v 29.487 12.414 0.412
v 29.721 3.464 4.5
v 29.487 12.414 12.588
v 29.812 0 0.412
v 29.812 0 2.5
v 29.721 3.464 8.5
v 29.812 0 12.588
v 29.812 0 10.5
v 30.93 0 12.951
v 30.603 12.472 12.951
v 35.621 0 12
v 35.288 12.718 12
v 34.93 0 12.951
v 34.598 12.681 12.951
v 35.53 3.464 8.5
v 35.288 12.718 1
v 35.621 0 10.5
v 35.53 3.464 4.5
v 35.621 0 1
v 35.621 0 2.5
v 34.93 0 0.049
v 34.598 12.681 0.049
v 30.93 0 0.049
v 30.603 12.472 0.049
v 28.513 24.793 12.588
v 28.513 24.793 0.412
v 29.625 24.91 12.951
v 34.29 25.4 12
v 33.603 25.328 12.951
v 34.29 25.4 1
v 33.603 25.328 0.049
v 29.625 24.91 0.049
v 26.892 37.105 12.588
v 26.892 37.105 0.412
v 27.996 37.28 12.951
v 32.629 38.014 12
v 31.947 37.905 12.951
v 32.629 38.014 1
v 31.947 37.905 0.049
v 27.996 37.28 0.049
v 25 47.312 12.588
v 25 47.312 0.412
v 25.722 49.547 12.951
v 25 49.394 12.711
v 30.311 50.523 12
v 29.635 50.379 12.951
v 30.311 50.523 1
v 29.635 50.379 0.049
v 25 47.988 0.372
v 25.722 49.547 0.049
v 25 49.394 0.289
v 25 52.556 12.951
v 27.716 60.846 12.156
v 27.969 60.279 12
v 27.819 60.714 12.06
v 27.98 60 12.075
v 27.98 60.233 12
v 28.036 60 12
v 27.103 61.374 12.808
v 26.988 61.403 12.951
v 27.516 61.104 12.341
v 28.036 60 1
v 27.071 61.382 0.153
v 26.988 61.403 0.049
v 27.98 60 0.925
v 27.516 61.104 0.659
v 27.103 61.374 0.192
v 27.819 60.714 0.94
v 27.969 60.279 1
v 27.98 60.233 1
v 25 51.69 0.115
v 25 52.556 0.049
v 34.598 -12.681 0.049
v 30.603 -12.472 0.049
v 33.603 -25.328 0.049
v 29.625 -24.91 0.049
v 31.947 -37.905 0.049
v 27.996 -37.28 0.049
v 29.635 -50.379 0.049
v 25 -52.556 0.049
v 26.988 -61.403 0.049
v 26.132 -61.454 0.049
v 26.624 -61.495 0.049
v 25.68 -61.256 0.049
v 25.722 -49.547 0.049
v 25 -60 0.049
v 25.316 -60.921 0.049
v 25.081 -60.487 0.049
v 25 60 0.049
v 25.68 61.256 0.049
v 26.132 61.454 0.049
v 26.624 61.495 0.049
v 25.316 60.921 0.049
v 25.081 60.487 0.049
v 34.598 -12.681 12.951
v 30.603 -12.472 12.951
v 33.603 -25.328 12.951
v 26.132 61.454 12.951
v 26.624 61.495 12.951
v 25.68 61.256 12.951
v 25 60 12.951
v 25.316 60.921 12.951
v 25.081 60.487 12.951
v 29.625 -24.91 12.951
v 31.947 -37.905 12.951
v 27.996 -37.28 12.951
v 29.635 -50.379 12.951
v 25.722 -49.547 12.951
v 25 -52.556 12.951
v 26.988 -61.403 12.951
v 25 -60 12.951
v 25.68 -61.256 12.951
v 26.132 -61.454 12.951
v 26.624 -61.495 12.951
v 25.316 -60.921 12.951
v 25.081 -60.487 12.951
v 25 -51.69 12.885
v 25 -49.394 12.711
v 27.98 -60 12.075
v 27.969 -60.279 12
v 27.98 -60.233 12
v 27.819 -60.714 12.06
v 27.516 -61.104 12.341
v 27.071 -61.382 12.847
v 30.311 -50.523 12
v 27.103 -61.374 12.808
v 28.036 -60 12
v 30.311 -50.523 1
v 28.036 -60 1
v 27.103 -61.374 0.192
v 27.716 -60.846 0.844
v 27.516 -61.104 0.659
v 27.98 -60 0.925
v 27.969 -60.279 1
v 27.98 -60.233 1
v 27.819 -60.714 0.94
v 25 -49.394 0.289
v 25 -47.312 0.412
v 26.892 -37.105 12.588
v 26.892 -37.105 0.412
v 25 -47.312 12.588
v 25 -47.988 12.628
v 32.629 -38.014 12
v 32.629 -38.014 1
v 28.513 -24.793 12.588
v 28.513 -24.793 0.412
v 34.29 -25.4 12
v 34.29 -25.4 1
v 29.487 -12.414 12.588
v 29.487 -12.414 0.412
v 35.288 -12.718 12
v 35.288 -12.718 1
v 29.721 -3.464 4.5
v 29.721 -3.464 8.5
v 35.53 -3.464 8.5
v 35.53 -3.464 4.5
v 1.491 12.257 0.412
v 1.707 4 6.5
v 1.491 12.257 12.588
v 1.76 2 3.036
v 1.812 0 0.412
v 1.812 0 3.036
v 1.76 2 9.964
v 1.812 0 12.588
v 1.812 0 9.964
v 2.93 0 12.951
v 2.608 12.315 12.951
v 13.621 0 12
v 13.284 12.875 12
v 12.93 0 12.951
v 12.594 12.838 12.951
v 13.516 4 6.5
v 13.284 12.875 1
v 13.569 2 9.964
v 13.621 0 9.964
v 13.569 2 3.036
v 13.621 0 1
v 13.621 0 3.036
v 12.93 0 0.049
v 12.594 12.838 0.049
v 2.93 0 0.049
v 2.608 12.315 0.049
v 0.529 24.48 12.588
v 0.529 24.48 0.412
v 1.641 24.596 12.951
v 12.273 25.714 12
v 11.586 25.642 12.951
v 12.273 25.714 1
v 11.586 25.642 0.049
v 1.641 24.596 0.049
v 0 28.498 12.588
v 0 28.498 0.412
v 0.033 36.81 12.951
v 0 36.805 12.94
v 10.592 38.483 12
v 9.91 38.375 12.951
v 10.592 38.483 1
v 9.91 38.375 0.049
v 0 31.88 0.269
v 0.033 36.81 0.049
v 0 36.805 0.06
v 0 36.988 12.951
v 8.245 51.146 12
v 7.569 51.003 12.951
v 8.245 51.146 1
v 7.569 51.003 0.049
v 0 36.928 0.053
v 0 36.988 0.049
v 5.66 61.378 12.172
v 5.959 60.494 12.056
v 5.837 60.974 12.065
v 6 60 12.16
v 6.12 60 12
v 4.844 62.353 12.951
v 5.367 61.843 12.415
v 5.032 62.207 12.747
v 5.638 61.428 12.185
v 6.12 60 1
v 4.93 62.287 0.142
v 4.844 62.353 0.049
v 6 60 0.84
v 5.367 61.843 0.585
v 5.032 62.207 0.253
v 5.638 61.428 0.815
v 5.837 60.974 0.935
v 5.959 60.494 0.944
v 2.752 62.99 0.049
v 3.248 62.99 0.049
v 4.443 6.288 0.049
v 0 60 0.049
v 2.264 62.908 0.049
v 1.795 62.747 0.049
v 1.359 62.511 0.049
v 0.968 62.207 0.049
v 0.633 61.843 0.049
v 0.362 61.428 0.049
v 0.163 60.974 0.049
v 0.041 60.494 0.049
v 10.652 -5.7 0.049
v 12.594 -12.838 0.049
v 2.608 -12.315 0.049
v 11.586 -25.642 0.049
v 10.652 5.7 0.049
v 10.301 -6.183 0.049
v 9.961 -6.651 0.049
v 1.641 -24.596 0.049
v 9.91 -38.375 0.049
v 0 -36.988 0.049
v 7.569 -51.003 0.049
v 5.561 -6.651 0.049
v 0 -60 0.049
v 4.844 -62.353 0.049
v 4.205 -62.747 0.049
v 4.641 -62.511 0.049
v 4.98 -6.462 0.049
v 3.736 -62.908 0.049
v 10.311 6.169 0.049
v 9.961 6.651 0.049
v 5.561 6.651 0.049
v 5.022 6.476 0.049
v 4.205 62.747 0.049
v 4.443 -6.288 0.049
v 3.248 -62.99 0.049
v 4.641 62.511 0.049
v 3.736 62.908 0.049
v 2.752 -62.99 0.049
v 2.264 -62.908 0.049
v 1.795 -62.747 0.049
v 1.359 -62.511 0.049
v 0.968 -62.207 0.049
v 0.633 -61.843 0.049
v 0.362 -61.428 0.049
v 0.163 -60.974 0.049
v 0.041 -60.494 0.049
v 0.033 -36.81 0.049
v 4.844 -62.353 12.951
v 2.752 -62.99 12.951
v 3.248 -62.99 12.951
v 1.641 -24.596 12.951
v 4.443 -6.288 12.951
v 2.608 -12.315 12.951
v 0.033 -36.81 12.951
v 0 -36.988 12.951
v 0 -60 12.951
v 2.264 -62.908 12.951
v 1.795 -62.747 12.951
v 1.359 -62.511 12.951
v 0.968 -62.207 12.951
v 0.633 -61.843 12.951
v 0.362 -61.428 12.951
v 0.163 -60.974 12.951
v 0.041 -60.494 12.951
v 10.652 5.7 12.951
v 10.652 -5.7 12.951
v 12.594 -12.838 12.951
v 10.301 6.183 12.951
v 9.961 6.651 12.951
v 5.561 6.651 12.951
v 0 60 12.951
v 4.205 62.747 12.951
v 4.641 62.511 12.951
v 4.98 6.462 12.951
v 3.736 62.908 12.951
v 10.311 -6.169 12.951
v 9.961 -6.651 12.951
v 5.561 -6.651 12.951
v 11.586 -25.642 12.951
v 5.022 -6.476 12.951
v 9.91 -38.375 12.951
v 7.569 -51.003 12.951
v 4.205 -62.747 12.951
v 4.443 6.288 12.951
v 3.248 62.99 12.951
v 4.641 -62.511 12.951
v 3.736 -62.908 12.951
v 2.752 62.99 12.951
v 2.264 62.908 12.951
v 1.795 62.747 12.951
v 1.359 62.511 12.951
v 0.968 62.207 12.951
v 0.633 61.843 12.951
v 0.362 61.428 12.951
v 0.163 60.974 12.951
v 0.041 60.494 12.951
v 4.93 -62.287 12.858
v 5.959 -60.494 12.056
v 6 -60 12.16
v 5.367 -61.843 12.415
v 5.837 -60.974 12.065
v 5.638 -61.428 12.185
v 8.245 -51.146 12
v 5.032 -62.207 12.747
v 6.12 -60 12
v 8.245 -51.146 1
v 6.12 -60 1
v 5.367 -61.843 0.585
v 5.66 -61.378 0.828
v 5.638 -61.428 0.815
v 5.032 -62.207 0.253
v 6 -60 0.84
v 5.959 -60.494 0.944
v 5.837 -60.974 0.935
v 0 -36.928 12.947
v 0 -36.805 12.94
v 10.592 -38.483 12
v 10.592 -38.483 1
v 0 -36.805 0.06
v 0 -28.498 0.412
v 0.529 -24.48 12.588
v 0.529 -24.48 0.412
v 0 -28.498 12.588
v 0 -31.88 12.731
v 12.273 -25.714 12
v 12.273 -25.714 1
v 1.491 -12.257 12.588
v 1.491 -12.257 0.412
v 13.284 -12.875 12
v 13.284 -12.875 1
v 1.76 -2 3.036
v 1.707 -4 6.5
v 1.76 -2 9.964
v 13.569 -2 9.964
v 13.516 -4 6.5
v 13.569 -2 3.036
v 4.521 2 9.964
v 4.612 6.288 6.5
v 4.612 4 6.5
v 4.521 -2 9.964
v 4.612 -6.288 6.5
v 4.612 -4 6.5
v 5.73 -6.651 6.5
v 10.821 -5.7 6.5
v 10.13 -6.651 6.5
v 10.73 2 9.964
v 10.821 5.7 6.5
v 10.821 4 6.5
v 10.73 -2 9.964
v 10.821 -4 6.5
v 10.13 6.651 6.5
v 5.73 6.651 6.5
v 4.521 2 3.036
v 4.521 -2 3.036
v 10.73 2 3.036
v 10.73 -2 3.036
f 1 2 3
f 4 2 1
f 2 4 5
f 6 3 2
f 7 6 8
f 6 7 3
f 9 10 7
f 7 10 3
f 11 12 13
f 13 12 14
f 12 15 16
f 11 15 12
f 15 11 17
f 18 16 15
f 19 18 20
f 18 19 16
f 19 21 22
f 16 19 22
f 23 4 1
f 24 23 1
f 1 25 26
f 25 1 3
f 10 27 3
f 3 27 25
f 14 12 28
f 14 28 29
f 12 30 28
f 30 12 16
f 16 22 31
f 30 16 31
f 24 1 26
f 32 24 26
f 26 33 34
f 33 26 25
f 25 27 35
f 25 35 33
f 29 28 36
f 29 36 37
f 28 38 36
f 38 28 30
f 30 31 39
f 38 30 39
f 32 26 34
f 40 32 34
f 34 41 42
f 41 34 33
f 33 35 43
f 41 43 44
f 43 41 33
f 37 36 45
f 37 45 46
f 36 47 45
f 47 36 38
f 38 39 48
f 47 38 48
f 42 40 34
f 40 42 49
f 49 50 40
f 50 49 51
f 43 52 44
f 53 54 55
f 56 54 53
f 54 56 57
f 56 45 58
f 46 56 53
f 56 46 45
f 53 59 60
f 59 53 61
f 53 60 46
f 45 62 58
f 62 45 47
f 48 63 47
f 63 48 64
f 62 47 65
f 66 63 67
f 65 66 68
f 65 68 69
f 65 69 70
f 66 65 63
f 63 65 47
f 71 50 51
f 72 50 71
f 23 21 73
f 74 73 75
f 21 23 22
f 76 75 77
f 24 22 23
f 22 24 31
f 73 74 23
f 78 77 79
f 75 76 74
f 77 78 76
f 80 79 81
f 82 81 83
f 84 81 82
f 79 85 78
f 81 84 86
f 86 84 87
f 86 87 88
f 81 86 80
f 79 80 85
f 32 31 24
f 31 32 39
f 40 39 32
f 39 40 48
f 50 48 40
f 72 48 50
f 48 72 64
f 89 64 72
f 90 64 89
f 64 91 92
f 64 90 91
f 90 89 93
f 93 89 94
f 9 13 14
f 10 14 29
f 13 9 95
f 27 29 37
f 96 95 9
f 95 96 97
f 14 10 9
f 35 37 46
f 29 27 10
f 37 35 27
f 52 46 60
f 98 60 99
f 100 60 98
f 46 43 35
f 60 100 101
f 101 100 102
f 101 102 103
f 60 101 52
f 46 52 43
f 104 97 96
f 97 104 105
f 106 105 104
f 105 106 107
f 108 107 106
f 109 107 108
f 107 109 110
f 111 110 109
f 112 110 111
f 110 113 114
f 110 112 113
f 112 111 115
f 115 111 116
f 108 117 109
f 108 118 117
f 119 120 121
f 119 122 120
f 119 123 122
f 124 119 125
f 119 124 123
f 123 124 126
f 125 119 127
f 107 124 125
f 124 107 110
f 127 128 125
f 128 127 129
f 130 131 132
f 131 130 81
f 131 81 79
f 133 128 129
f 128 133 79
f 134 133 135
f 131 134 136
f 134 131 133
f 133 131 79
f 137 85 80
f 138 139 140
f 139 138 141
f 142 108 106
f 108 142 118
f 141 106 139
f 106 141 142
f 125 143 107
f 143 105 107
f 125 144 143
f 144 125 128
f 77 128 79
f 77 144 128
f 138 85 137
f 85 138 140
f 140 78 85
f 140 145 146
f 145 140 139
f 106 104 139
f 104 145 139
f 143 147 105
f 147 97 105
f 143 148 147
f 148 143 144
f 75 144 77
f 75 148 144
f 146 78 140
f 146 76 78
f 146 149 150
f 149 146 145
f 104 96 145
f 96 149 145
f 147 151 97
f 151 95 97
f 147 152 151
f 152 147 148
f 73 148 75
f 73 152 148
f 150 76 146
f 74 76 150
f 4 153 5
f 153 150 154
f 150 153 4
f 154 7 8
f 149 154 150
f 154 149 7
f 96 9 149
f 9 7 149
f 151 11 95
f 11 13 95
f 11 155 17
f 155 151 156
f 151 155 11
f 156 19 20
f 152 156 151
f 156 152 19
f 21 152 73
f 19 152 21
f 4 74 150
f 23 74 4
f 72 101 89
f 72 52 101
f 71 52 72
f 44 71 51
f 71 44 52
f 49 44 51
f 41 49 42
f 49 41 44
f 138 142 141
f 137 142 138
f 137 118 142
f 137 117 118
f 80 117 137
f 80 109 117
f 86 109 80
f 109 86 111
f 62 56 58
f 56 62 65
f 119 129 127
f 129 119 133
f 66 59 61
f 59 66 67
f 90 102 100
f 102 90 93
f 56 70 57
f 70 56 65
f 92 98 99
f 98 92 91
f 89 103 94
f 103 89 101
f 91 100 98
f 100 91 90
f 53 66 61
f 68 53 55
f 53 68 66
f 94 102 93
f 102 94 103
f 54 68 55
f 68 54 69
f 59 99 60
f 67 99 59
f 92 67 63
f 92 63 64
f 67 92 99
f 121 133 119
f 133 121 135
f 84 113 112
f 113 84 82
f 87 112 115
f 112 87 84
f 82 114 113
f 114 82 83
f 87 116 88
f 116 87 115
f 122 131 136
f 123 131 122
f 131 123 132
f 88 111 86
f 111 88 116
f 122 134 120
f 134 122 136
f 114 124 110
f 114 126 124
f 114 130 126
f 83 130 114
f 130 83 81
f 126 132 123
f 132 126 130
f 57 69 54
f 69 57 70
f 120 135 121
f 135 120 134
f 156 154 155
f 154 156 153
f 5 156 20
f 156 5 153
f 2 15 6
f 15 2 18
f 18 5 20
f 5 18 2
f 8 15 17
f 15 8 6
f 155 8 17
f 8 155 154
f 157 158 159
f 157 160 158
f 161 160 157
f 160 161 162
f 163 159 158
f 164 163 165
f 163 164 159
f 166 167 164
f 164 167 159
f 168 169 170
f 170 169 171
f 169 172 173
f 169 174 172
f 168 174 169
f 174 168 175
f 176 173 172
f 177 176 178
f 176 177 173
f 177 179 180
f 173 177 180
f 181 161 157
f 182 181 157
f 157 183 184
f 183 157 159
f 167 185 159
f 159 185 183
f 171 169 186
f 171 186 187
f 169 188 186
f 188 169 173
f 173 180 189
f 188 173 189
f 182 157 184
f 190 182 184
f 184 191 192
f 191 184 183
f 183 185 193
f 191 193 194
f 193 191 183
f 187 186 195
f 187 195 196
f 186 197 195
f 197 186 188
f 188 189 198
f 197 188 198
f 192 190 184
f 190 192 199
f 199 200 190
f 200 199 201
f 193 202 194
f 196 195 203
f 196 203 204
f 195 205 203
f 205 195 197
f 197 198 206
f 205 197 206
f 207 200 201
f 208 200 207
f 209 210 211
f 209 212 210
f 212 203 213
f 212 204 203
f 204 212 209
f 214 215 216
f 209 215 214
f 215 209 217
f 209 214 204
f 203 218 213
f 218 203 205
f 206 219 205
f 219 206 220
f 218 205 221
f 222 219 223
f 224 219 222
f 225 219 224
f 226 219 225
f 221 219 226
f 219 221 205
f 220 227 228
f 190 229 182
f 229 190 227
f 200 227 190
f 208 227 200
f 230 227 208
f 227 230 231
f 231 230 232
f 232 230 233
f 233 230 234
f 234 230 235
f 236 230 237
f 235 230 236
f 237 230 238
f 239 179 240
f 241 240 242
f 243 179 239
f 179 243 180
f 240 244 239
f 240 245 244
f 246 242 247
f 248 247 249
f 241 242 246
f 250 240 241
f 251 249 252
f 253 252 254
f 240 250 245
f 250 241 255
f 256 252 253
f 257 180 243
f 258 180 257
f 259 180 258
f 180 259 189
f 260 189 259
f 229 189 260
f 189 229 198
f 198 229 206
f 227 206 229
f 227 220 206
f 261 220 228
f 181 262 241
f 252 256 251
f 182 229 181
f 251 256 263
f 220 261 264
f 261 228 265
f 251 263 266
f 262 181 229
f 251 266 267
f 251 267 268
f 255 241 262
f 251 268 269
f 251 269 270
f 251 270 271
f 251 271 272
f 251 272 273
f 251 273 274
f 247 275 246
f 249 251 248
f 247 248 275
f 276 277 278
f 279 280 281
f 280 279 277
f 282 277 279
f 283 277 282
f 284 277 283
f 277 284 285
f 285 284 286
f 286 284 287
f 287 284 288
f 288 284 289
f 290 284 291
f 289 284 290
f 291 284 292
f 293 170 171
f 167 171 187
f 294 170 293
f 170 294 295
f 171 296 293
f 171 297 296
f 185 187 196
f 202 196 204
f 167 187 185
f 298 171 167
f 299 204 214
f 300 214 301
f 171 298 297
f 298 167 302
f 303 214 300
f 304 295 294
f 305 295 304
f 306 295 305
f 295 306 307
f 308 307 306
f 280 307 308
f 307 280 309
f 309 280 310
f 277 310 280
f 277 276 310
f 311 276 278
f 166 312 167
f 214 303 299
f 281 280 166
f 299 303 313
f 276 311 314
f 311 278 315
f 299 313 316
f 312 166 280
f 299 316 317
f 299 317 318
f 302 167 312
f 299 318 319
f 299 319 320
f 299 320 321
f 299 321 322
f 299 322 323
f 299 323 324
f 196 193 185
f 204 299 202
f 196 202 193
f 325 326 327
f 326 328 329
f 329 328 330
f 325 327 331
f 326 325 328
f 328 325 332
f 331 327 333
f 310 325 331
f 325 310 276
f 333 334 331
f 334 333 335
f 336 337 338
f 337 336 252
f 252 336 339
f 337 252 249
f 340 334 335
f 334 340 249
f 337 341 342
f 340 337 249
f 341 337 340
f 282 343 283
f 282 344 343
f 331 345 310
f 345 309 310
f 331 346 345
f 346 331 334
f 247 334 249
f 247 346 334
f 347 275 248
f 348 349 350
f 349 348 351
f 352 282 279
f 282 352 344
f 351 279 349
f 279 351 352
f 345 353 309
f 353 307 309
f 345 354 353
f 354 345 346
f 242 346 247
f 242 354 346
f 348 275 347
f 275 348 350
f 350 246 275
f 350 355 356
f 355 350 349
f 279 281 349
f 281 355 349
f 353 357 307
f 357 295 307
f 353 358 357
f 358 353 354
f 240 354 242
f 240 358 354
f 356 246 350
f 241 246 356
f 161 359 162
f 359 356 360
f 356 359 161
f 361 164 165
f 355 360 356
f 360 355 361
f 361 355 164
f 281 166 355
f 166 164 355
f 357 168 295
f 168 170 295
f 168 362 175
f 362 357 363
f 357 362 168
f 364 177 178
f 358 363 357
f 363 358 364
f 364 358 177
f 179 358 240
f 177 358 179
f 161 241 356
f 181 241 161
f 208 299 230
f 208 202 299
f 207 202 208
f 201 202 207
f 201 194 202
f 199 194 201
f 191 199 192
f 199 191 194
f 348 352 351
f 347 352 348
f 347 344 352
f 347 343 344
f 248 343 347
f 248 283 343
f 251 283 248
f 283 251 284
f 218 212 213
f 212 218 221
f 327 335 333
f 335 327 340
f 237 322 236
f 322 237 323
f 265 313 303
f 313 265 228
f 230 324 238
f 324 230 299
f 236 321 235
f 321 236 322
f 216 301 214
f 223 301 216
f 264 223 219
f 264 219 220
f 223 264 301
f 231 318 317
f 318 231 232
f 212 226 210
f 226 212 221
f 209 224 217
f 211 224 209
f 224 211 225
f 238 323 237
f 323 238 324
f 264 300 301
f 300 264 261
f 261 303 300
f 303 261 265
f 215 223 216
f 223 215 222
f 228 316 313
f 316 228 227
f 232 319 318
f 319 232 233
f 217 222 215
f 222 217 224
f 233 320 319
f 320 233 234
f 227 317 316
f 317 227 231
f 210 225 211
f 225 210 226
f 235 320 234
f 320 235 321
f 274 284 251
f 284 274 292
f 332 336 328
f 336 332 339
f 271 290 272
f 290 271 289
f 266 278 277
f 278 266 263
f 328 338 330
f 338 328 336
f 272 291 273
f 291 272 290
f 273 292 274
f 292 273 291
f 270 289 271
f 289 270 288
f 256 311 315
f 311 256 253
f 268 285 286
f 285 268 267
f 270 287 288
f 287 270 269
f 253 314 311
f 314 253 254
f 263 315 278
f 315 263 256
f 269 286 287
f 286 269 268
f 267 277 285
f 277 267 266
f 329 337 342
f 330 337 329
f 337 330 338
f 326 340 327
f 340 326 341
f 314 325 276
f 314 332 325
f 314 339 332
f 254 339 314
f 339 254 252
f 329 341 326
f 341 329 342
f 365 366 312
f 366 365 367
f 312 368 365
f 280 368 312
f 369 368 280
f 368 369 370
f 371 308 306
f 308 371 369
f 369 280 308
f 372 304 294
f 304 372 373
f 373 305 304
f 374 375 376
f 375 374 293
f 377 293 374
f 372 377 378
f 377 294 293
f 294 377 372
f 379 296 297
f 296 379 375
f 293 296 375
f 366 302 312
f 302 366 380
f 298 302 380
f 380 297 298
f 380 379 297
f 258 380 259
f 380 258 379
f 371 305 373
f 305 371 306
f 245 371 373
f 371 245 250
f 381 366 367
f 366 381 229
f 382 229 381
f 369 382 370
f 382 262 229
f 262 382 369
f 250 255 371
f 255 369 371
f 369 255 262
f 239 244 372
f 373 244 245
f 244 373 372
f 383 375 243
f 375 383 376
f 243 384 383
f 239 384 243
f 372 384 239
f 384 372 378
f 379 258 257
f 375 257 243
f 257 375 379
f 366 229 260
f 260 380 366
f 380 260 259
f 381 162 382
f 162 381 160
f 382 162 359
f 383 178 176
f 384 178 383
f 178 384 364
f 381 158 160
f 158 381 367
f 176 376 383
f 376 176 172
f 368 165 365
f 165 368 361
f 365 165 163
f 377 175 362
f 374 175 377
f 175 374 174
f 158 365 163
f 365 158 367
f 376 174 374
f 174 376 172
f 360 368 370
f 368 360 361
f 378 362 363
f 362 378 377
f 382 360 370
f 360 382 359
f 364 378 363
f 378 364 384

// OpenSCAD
// Number of sides your stick has
side_count = 6;

// This is in mm, and must be measured at the largest diameter (corner-to-corner, not edge-to-edge).  My chopsticks are 5.5mm, pencils are 8mm.  
stick_diameter = 8;

// Length in mm
arm_length = 120;

// Width in mm - make sure it's greater than your stick's diameter!
arm_width = 13;

// Controls curvature of arms - higher numbers yield less curve.
radius_factor = 2; 

/* [Hidden] */
bevel = 2;
width = arm_width;
$fa = .5; // resolution: 3/3 is good for design, maybe use 0.5/0.5 for printing
$fs = .5;

module round_stick() { 
  length = 200;
  dia = stick_diameter;  // 5.5 seems to work for chopstick, trying 8 for pencil
  
  cylinder(h=length, r=dia/2, $fn=side_count); // $fn=6 gives hexagonal hole for pencil
}

module crossbar(width, thickness, bevel) {
  function loop_drop(arm_length=arm_length, radius_factor=radius_factor) = -cos(asin((arm_length/2)/(arm_length*radius_factor)))*arm_length*radius_factor; // calculates how far to lower the loop
  
  module loop() { // this module draws the big loop
    translate([-width/2, 0, loop_drop(arm_length, radius_factor)]) 
      rotate([0, 90, 0]) 
        rotate_extrude(angle=360, convexity=10, $fs=3, $fa=3)
          translate([bevel/2+radius_factor*arm_length-thickness/2, bevel/2, 0]) 
            minkowski() {
              square([thickness-bevel, width-bevel]);
              circle(r=bevel/2);
            }
  }  
  
  intersection() { // cuts the segment of the loop that we want
    loop();
    translate([-arm_length, -arm_length/2, 0]) cube([arm_length*2, arm_length, arm_length*2]);
  }
  
  intersection() { // makes the rounded ends
    loop();
    for (i=[1,-1])
      translate([0, i*arm_length/2, thickness/4])
        rotate([0, 90, 0])
          cylinder(h=width+2, r=thickness/4, center=true);
  }
}

module little_crossbar(template=false) { // set template true if using it to make a hole
  thickness = 6;
  clearance = .4;
  
  if (template==true) {
    crossbar(width=width+clearance, thickness=thickness+clearance, bevel=bevel);
  }
  else {
    difference() {
      crossbar(width=width, thickness=thickness, bevel=bevel);
      round_stick();
    }
  }
}

module big_crossbar() {
  difference() {
    crossbar(width=width, thickness=12, bevel=bevel);
    rotate([0,0,90]) little_crossbar(template=true);
    rotate([0,0,90]) round_stick(); // rotated to match other spindle in case the stick lacks 90* rotational symmetry
  }
}

translate([25, 0, width/2]) rotate([0, 90, 0]) // rotating may eliminate need for supports
  little_crossbar();
translate([0, 0, width/2]) rotate([0, 90, 0])
  big_crossbar();
